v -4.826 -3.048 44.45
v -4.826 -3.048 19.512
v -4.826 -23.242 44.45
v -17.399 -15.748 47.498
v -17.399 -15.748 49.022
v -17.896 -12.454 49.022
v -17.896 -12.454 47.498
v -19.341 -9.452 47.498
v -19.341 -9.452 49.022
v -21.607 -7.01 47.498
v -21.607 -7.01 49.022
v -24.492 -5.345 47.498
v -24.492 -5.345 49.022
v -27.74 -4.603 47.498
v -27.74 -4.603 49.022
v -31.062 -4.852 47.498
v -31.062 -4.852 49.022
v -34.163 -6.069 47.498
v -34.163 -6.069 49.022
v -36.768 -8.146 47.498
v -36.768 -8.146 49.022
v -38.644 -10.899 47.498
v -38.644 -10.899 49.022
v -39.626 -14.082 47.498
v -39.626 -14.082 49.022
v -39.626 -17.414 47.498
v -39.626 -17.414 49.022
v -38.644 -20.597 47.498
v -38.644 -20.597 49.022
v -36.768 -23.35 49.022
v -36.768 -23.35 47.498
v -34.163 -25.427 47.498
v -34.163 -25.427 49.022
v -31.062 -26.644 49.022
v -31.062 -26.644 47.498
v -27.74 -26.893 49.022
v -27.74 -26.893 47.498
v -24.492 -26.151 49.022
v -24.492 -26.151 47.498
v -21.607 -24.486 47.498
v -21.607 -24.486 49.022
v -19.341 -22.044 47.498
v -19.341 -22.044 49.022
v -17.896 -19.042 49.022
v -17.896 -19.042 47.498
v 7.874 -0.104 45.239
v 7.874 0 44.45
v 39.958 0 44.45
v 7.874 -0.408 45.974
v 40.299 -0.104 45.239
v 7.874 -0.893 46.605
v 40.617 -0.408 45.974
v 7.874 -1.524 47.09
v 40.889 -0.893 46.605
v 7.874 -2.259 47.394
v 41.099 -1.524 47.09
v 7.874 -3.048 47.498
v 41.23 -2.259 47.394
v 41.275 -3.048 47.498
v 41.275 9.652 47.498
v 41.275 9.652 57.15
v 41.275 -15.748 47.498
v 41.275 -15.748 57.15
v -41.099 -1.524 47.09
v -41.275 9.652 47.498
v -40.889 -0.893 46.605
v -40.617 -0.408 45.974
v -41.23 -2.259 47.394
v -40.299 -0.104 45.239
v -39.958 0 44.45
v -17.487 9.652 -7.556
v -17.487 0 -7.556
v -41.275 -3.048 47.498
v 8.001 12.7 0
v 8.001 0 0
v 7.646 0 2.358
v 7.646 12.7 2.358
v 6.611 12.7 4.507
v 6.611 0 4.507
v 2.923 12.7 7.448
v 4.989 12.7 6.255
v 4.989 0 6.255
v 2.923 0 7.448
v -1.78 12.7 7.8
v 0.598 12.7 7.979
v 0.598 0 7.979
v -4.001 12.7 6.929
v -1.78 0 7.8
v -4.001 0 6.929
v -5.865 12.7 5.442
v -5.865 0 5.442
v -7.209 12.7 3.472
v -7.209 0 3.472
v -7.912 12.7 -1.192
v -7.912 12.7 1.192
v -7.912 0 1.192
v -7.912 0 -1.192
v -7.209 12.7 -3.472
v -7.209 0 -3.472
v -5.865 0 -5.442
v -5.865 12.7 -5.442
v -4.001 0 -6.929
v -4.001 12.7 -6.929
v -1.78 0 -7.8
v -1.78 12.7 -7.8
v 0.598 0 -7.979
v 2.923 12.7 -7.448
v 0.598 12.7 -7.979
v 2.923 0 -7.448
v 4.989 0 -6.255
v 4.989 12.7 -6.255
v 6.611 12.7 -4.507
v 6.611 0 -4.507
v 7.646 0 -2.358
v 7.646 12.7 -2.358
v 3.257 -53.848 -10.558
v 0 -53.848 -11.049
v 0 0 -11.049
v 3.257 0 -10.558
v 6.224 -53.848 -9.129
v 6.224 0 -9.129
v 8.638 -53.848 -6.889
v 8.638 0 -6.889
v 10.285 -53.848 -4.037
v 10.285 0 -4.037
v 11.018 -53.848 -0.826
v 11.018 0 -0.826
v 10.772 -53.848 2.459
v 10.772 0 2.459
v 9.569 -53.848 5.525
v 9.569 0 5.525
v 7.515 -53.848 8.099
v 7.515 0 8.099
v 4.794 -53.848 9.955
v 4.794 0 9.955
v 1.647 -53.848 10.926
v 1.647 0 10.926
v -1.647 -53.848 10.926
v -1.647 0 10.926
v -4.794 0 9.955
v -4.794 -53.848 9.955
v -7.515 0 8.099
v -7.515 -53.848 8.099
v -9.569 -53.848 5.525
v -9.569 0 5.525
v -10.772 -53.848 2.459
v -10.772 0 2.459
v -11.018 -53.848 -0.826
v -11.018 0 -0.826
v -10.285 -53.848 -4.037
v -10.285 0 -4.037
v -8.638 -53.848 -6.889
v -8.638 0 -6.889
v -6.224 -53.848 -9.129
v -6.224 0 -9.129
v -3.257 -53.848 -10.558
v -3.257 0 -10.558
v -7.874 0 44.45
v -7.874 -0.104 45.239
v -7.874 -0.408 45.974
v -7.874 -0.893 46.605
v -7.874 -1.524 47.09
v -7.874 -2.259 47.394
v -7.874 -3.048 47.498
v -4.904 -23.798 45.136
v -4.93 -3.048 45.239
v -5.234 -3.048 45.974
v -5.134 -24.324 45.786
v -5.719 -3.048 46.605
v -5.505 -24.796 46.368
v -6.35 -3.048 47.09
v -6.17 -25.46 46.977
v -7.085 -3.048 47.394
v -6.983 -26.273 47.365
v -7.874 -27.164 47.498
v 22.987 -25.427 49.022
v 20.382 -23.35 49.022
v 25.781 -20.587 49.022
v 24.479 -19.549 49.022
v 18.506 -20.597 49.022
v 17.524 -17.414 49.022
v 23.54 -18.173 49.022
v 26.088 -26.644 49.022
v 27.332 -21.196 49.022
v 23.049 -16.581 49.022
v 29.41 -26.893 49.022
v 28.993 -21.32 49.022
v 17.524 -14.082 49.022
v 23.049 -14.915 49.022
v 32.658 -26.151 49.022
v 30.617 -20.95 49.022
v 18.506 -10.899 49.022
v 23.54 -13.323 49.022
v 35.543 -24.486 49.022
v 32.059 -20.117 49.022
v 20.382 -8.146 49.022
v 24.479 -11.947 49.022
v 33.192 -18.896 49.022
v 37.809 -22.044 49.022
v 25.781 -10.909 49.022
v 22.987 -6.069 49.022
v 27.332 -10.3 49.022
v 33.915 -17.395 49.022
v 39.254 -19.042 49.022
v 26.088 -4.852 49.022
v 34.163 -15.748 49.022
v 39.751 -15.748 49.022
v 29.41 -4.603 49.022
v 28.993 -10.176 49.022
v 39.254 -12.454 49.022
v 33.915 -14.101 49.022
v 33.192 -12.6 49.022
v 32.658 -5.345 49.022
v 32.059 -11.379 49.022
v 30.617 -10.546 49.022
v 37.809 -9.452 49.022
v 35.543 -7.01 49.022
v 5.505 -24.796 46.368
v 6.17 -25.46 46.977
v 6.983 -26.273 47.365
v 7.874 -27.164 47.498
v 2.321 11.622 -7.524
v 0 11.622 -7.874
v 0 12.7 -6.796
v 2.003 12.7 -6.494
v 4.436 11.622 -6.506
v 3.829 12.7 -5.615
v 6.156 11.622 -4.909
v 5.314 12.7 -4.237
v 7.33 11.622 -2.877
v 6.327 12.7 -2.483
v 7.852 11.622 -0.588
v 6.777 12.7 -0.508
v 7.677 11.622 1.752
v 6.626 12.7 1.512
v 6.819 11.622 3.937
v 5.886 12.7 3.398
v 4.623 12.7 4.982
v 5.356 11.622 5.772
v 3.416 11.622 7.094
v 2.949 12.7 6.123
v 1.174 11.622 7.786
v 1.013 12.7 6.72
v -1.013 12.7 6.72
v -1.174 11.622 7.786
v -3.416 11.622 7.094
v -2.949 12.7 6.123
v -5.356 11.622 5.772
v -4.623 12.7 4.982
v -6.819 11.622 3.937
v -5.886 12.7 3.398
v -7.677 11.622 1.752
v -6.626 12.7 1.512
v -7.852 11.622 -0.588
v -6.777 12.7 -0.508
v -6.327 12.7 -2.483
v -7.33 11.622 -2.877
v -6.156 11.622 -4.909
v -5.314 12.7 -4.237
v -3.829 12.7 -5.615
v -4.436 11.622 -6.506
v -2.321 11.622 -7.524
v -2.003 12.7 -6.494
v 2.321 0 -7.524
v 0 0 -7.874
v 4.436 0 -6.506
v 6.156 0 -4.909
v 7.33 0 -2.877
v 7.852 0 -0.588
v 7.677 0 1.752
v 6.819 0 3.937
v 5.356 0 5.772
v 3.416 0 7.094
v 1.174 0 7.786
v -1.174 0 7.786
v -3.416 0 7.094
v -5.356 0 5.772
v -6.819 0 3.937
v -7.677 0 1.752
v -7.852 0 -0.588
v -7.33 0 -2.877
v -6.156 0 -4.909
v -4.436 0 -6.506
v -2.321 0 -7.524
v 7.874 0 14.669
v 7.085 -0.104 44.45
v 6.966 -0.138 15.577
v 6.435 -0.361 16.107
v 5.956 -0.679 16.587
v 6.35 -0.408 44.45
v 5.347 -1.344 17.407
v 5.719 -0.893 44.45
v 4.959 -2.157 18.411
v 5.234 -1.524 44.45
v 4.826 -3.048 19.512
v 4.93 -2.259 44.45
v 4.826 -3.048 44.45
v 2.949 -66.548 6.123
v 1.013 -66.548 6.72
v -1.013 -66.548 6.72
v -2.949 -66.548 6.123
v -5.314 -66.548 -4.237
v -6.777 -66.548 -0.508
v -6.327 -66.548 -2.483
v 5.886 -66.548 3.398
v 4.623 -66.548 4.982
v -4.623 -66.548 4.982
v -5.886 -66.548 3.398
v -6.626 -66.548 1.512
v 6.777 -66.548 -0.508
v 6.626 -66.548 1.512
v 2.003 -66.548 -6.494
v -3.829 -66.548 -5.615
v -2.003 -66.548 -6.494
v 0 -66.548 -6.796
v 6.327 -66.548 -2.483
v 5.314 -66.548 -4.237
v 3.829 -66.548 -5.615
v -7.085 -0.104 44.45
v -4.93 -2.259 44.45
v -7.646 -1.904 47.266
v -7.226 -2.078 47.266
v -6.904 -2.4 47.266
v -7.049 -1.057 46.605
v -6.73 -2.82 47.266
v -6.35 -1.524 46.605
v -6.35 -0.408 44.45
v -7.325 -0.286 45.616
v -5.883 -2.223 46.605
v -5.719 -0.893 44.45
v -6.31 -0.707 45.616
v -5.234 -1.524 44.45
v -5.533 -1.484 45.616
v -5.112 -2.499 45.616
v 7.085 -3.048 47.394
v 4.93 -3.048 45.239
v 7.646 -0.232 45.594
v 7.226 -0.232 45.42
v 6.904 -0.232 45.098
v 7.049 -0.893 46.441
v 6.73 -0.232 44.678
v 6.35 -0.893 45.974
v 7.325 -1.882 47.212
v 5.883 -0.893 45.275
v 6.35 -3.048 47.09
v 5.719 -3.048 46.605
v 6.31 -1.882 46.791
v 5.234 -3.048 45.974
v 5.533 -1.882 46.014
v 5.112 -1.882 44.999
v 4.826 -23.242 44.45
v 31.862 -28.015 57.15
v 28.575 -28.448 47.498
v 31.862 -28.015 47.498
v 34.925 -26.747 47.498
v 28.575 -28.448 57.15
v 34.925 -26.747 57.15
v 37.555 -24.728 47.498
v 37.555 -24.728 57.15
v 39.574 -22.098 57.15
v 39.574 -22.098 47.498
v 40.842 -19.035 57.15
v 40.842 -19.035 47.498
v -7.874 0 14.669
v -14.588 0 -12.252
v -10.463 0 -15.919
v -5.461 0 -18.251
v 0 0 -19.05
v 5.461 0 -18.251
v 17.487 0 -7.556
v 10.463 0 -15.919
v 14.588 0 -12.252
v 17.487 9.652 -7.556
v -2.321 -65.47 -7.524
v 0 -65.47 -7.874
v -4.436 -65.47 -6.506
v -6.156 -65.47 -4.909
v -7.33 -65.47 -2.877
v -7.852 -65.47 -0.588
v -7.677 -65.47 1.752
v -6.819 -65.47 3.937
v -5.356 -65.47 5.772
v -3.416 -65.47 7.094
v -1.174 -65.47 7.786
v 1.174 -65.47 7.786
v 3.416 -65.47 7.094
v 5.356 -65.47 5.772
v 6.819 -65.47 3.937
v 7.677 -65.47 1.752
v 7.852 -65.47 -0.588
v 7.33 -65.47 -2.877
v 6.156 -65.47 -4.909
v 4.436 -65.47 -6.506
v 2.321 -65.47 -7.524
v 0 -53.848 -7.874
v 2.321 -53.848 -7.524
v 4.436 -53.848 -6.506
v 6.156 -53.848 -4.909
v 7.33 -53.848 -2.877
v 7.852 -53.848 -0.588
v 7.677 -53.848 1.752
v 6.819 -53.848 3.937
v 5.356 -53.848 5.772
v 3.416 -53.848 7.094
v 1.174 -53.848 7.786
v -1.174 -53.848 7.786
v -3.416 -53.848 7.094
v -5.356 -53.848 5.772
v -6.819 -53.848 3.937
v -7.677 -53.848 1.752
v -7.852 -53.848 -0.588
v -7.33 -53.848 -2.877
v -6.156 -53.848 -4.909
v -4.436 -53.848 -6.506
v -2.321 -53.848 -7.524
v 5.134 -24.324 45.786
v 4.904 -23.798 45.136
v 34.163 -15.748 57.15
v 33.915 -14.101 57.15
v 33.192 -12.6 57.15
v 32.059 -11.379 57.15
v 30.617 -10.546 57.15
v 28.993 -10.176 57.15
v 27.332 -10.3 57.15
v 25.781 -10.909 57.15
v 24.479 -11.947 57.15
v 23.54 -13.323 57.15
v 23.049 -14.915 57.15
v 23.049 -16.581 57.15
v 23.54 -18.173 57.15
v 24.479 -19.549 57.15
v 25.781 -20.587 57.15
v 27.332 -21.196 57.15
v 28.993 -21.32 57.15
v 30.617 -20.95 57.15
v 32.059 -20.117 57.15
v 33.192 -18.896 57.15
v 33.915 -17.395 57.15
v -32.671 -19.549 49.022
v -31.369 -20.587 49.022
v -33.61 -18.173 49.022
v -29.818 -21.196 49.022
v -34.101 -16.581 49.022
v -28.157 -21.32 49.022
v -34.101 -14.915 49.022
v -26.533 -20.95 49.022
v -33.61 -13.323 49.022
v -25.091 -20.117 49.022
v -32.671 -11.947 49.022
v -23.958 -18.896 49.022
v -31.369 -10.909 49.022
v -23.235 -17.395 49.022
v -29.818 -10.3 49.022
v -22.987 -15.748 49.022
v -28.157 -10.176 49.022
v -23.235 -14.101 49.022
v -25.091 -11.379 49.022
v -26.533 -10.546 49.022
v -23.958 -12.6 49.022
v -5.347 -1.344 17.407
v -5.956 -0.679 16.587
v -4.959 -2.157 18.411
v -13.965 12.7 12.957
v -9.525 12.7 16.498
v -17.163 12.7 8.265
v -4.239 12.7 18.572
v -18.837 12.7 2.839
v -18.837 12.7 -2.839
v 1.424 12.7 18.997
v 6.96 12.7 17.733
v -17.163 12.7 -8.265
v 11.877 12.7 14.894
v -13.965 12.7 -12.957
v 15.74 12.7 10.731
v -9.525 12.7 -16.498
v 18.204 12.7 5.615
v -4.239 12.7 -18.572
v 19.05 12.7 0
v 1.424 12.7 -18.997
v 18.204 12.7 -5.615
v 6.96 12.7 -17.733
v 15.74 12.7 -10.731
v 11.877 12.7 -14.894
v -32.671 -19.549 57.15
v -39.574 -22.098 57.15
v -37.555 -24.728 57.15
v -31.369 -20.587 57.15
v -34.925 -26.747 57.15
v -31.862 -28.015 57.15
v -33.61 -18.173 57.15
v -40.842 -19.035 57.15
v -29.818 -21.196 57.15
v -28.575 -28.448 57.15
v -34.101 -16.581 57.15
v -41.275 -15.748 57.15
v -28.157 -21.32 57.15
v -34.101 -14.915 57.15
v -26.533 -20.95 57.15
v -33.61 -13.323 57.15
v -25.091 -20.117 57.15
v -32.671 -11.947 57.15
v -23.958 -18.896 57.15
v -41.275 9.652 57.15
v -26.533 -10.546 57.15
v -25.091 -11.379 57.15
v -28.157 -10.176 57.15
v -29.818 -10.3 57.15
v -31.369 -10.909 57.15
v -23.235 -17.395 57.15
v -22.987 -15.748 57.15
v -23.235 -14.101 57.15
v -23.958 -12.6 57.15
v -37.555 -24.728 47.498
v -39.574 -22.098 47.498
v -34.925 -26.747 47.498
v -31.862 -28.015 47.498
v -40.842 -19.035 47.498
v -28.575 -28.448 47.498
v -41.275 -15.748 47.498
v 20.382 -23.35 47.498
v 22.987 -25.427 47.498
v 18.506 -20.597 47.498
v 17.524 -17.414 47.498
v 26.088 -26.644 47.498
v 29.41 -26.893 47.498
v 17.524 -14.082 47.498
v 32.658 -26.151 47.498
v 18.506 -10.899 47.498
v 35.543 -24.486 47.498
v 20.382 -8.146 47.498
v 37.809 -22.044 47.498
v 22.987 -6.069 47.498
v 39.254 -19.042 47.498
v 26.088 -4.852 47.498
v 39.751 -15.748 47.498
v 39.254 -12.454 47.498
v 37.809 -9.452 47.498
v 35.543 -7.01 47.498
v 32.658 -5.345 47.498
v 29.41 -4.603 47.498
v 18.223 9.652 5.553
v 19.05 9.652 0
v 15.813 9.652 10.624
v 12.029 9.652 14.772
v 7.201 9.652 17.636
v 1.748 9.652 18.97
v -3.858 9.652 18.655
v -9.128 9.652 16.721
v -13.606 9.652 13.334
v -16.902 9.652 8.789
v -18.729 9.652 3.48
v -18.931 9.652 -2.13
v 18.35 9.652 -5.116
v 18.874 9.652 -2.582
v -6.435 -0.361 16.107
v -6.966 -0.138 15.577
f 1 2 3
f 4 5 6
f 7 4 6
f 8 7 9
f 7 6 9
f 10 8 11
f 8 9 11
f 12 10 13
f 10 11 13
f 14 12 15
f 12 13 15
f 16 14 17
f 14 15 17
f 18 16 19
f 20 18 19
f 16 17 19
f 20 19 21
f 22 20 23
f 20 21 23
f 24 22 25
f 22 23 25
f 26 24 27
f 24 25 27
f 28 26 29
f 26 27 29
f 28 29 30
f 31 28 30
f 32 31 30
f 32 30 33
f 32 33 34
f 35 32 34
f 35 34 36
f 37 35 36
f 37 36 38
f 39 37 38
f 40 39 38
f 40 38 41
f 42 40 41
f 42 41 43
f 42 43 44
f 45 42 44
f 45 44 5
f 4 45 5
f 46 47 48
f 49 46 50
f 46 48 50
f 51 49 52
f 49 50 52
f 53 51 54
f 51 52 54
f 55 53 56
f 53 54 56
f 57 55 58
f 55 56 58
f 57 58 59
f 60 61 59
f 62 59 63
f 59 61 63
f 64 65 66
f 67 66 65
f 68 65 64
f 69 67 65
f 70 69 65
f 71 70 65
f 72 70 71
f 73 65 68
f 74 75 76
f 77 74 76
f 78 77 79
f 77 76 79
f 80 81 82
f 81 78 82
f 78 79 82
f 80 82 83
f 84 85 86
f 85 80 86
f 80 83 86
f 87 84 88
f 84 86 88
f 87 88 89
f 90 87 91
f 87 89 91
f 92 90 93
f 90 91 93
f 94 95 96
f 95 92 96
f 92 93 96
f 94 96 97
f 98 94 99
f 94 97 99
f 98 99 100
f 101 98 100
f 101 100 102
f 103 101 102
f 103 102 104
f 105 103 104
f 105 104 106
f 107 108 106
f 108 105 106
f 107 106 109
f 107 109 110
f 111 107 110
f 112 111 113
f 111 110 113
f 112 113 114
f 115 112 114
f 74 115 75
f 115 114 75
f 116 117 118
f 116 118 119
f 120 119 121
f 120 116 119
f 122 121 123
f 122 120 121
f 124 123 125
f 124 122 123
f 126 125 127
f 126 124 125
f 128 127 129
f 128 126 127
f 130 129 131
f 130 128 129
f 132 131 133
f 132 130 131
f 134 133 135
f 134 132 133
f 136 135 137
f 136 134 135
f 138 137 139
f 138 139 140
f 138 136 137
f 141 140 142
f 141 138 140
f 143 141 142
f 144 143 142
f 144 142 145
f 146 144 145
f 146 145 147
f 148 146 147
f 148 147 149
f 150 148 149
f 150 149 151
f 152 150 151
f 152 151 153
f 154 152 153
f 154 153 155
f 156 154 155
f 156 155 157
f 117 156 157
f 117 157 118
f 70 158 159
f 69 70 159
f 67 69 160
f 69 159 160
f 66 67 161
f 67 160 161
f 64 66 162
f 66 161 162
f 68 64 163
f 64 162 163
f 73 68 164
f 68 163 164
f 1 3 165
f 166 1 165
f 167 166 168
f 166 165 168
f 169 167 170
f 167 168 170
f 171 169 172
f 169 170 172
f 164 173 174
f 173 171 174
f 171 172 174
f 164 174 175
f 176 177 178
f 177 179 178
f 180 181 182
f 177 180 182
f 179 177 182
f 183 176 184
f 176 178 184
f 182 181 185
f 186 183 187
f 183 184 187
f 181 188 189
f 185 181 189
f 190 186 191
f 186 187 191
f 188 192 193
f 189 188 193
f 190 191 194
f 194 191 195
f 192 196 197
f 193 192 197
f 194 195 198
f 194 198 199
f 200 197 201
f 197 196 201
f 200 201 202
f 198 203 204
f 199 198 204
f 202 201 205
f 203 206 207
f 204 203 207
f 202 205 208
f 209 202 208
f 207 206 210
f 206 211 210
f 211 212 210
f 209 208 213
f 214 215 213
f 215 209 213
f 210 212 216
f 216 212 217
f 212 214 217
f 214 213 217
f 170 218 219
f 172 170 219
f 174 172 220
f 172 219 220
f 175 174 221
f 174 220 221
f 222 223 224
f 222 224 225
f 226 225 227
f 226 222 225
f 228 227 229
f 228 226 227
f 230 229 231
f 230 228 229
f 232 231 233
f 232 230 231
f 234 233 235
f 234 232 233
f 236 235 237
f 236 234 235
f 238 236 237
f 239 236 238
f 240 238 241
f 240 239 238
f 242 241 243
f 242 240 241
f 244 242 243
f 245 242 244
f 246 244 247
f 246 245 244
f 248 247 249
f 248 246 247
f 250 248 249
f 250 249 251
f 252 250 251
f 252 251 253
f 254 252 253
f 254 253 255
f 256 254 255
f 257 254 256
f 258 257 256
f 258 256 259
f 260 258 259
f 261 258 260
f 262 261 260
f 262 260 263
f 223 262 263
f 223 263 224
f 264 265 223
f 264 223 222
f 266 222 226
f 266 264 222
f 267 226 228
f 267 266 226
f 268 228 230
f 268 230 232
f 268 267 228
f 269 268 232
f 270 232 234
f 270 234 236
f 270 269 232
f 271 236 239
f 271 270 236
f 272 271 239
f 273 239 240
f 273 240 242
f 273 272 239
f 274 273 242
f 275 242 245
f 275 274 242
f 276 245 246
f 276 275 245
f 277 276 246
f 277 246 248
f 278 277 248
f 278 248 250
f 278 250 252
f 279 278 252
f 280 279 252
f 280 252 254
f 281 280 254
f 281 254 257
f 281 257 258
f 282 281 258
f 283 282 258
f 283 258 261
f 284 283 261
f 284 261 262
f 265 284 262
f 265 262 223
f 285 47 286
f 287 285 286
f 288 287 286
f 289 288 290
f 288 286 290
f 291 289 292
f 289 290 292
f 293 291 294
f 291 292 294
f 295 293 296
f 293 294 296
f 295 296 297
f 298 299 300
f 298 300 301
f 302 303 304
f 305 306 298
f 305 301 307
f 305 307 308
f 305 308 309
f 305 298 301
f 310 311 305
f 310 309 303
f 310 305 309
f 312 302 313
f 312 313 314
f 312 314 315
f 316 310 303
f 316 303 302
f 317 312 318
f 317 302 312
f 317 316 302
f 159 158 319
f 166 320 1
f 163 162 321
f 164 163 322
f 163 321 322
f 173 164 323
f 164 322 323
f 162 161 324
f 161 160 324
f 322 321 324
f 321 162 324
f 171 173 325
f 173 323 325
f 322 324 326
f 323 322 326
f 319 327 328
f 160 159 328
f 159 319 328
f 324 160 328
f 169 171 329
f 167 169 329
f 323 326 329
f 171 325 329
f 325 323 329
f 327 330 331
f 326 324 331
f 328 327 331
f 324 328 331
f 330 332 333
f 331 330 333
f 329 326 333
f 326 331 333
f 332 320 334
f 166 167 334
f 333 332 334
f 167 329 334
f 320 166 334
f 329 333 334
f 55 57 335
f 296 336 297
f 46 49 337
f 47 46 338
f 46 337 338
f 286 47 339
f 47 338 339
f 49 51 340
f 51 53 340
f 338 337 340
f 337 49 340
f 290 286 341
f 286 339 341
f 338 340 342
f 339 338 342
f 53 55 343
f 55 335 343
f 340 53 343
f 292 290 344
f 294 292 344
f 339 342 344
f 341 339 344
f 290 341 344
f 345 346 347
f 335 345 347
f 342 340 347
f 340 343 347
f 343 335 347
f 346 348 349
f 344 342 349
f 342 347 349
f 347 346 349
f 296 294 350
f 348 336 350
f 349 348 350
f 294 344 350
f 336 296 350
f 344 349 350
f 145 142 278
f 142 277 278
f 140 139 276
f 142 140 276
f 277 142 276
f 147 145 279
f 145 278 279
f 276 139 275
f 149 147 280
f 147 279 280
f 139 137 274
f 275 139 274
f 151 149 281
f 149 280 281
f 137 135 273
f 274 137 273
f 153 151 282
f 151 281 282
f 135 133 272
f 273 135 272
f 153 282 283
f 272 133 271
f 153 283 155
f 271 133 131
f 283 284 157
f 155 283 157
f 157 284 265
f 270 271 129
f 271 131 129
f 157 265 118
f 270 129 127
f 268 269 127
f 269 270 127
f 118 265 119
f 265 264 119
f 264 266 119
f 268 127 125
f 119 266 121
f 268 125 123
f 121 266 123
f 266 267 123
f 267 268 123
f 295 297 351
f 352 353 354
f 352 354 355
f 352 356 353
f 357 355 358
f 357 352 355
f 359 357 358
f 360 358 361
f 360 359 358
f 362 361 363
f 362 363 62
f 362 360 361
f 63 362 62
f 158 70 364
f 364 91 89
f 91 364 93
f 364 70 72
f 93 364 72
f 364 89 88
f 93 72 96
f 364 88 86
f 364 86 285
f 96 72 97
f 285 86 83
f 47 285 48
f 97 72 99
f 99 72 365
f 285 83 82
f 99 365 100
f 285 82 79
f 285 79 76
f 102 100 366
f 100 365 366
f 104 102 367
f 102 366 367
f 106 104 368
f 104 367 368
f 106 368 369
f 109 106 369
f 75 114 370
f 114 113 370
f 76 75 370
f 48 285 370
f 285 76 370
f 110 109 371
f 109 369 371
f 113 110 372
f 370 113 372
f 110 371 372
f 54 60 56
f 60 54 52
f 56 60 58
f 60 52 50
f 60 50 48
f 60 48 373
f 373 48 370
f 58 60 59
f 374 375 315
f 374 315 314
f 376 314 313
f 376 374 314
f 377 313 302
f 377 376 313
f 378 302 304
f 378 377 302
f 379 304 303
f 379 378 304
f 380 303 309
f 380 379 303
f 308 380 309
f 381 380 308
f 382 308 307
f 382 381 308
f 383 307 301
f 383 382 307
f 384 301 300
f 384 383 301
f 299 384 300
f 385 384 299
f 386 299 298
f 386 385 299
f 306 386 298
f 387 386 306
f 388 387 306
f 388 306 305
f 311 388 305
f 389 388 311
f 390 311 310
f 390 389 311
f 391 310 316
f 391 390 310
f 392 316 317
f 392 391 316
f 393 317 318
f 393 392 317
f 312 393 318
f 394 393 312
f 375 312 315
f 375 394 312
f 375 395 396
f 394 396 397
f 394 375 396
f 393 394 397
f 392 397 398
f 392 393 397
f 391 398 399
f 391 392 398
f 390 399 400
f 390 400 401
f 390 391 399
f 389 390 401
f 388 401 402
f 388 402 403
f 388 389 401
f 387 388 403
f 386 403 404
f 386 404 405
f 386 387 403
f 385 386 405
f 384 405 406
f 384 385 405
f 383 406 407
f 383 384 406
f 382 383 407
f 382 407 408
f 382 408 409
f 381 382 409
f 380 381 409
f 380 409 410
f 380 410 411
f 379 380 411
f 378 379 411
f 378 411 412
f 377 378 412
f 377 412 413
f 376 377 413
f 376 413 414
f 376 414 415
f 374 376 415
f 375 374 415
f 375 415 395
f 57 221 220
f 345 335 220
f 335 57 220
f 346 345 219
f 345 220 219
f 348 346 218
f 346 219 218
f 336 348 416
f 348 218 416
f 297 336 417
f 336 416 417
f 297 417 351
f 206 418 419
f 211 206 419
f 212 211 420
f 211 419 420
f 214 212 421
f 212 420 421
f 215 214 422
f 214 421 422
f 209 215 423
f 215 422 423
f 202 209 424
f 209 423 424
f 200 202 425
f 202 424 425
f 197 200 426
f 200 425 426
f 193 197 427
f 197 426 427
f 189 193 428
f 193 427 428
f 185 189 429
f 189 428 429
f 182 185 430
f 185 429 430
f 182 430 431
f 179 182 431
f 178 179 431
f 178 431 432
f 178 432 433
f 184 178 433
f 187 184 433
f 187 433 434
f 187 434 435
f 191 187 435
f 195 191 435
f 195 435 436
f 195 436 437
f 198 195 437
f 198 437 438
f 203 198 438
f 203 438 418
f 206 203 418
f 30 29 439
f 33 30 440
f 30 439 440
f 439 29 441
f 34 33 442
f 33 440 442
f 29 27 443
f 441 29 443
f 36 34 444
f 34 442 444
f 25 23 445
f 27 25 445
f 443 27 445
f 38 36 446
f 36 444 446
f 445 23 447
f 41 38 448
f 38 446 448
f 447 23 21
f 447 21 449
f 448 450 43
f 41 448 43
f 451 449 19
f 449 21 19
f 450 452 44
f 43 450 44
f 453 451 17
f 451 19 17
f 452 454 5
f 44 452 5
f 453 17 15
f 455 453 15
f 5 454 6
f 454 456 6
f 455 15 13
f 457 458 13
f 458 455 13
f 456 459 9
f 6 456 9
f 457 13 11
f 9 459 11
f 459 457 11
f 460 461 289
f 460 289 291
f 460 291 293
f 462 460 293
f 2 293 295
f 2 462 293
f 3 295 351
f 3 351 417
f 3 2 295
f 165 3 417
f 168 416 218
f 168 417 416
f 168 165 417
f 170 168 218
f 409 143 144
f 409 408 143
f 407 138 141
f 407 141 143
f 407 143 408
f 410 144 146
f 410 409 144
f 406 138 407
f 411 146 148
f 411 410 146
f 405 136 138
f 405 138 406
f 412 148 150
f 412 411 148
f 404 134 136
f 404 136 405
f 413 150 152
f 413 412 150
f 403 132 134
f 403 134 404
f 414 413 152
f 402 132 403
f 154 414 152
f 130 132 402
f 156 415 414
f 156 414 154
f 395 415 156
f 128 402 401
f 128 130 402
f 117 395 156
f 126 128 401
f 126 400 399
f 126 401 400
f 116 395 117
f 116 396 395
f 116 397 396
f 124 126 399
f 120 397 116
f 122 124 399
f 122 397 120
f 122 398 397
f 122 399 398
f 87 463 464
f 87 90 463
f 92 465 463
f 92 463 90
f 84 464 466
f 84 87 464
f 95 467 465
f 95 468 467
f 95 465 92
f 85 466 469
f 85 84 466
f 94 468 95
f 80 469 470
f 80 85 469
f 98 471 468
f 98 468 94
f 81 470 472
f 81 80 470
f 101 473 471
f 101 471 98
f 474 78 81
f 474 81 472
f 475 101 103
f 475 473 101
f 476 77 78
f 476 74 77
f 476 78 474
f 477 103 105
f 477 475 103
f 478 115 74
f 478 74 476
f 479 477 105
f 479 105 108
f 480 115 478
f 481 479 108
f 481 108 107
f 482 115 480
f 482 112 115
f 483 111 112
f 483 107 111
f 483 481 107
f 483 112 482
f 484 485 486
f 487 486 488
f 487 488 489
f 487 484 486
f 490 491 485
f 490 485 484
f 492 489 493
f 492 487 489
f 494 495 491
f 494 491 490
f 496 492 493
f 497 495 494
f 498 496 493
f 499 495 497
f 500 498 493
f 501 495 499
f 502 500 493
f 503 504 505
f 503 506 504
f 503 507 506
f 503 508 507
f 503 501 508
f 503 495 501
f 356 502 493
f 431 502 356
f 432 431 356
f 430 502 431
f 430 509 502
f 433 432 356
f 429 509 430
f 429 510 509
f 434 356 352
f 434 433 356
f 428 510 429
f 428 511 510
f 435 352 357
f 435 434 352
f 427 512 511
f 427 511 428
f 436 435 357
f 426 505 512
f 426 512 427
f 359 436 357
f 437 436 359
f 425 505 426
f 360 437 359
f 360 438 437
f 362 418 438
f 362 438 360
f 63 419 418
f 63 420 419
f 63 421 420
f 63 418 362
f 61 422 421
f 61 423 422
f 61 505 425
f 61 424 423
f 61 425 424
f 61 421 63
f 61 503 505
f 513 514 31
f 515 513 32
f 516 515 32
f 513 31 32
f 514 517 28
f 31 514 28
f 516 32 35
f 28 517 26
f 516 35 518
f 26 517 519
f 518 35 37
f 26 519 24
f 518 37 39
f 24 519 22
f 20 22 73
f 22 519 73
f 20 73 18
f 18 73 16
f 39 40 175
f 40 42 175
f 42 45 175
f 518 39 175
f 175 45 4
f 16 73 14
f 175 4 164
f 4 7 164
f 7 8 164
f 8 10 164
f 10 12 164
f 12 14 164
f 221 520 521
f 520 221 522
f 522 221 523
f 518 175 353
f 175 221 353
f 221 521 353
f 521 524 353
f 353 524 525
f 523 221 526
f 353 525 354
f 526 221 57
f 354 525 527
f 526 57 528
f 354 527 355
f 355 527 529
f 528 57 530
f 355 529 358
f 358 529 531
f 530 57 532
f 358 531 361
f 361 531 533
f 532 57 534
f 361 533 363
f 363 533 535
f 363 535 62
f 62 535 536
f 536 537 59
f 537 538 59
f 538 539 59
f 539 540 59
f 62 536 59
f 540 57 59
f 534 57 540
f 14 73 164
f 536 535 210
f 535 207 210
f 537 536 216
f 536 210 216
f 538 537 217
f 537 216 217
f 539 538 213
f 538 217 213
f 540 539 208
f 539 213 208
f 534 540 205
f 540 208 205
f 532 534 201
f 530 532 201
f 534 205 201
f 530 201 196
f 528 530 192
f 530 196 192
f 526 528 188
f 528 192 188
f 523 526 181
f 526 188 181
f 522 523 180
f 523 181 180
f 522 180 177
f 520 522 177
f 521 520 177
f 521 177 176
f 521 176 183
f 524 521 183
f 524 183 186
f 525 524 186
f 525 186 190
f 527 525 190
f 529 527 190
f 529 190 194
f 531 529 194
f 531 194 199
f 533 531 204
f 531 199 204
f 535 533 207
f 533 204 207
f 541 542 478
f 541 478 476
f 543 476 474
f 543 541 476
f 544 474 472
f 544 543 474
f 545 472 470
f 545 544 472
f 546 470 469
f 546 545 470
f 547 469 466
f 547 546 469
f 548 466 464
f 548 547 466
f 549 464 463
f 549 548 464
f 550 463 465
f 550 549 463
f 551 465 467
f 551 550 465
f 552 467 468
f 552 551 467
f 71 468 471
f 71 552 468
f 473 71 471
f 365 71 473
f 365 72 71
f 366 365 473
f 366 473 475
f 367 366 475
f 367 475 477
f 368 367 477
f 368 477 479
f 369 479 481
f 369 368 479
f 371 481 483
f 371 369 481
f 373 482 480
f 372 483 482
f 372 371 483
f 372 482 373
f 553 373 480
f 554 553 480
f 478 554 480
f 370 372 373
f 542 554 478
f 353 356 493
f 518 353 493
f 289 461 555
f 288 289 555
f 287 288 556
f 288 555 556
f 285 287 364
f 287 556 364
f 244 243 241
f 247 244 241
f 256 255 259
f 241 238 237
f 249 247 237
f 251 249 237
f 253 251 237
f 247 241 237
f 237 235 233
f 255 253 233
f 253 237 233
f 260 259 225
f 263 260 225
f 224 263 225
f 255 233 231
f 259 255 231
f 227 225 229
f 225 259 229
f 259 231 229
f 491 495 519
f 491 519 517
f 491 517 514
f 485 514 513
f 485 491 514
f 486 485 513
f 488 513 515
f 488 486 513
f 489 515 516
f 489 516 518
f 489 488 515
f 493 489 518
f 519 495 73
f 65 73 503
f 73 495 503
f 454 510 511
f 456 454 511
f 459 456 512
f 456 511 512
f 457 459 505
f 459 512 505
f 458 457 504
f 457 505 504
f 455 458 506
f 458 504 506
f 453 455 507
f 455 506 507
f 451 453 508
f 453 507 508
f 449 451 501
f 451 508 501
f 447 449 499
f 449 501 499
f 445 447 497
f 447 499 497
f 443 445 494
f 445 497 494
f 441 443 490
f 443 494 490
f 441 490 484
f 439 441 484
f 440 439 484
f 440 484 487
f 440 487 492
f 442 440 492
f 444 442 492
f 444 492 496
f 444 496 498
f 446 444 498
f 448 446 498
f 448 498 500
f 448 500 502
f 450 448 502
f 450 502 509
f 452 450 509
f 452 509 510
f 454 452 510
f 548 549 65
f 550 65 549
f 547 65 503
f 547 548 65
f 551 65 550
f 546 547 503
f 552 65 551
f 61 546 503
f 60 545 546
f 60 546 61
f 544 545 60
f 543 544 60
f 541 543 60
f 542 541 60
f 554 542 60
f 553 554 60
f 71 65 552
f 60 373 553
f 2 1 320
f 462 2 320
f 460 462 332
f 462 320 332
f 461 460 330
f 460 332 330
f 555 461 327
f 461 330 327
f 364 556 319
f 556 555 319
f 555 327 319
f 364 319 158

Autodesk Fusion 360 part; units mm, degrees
sketch "Sketch1" plane through (0, 0, 0) normal (0, 1, 0) x (1, 0, 0) in component "Component"
  line L0 (26.924, -11.049) -> (-26.924, -11.049)
  line L1 (-26.924, -11.049) -> (-26.924, 11.049)
  line L2 (-26.924, 11.049) -> (26.924, 11.049)
  line L3 (26.924, 11.049) -> (26.924, -11.049)
  line L4 (38.5464, -7.874) -> (-38.5464, -7.874)
  line L5 (-39.624, -6.7964) -> (-39.624, 6.7964)
  line L6 (-38.5464, 7.874) -> (38.5464, 7.874)
  line L7 (39.624, 6.7964) -> (39.624, -6.7964)
  line L8 (-39.624, 6.7964) -> (-39.624, -6.7964) construction
  line L9 (-39.624, 6.7964) -> (-38.5464, 7.874)
  line L10 (-39.624, 6.7964) -> (-38.1, 6.7964) construction
  line L11 (-39.624, -6.7964) -> (-38.5464, -7.874)
  line L12 (-39.624, -6.7964) -> (-38.1, -6.7964) construction
  line L13 (0, -1.75) -> (0, -22.5)
  line L14 (39.624, 6.7964) -> (38.5464, 7.874)
  line L15 (39.624, 6.7964) -> (39.624, -6.7964) construction
  line L16 (39.624, -6.7964) -> (38.5464, -7.874)
  line L17 (-45.72, 0) -> (46.9131, 0)
  dimension "d1" = 53.848
  dimension "d2" = 22.098
  dimension "d11" = 45
  dimension "d12" = 1.524
  dimension "d13" = 1.524
  dimension "d14" = 45
revolve "Revolve1" add sketch "Sketch1" angle 360 about axis through (1.75, 0, 0) along (1, 0, 0) contours L1 L3 L6 L17 | L3 L6 L7 L14 L17 | L1 L2 L3 L6 | L1 L5 L6 L9 L17 makes body 1 in component "Component"
sketch "Sketch2" plane through (0, 0, 0) normal (0, 1, 0) x (1, 0, 0) in component "Component"
  circle A0 centre (0, 0) radius 8.001
  dimension "d16" = 16.002
sketch "Sketch1 (2)" plane through (0, 0, 0) normal (0, 1, 0) x (1, 0, 0) in component "Component'"
  circle A0 centre (0, 0) radius 8.001
  circle A1 centre (0, 0) radius 19.05
  line L0 (0, 0) -> (0, -57.15) construction
  line L1 (-41.275, -57.15) -> (41.275, -57.15)
  line L2 (-41.275, -57.15) -> (41.275, -57.15)
  line L3 (41.275, -57.15) -> (41.275, -47.498)
  line L4 (41.275, -47.498) -> (-41.275, -47.498)
  line L5 (-41.275, -47.498) -> (-41.275, -57.15)
  line L6 (-41.275, -47.498) -> (-17.4874, 7.5559)
  line L7 (41.275, -47.498) -> (17.4874, 7.5559)
  line L8 (4.826, -15.748) -> (-4.826, -15.748)
  line L9 (-4.826, -15.748) -> (-4.826, -47.498)
  line L10 (-4.826, -47.498) -> (4.826, -47.498)
  line L11 (4.826, -47.498) -> (4.826, -15.748)
  dimension "d17" = 16.002
  dimension "d18" = 38.1
  dimension "d19" = 57.15
  dimension "d21" = 82.55
  dimension "d22" = 9.652
  dimension "d39" = 9.652
  dimension "d40" = 31.75
extrude "Extrude1" add sketch "Sketch1 (2)" along normal blind 9.652 separate body contours A1 L4 L7 L11 | A1 L4 L9 L10 L11 | A1 L4 L6 L9 | L1 L2 L3 L4 L5 L10 makes body 2 in component "Component'"
extrude "Extrude2" add sketch "Sketch1 (2)" along normal blind 12.7 contours A1 L8 L9 L11 | A1 L8 L9 L11 bodies 2 in component "Component'"
sketch "Sketch2 (2)" plane through (0, 0, 57.15) normal (0, 0, 1) x (1, 0, 0) in component "Component'"
  line L0 (-41.275, 0) -> (41.275, 0)
  line L1 (41.275, 0) -> (41.275, 9.652)
  line L2 (41.275, 9.652) -> (-41.275, 9.652)
  line L3 (-41.275, 9.652) -> (-41.275, 0)
  line L4 (-41.275, 0) -> (41.275, 0)
  line L5 (-41.275, 9.652) -> (41.275, 9.652)
  line L6 (41.275, 9.652) -> (41.275, -15.748)
  line L7 (28.575, -28.448) -> (-28.575, -28.448)
  line L8 (-41.275, -15.748) -> (-41.275, 9.652)
  arc A0 (-41.275, -15.748) -> (-28.575, -28.448) centre (-28.575, -15.748) ccw
  arc A1 (28.575, -28.448) -> (41.275, -15.748) centre (28.575, -15.748) ccw
  circle A2 centre (-28.575, -15.748) radius 5.588
  circle A3 centre (-28.575, -15.748) radius 11.176
  circle A4 centre (28.575, -15.748) radius 5.588
  circle A5 centre (28.575, -15.748) radius 11.176
  point P0 (-41.275, -28.448)
  dimension "d28" = 82.55
  dimension "d44" = 82.55
  dimension "d45" = 38.1
  dimension "d46" = 12.7
  dimension "d47" = 12.7
  dimension "d48" = 11.176
  dimension "d49" = 22.352
  dimension "d50" = 11.176
  dimension "d51" = 22.352
extrude "Extrude6" add sketch "Sketch2 (2)" against normal blind 9.652 contours L0 L4 L6 L7 L8 A0 A1 bodies 2 in component "Component'"
extrude "Extrude7" add sketch "Sketch2 (2)" against normal up to surface (8.128 mm away) contours A3 | A5 bodies 2 in component "Component'"
extrude "Extrude8" add sketch "Sketch1 (2)" against normal up to surface (28.448 mm away) contours A1 L4 L9 L10 L11 | A1 L8 L9 L11 picked at (0, -16.8487) bodies 2 in component "Component'"
sketch "Sketch4" plane through (-4.826, 0, 0) normal (-1, 0, 0) x (0, 0, 1) in component "Component'"
  line L0 (15.748, -28.448) -> (47.498, -28.448)
  line L1 (47.498, -28.448) -> (47.498, 0)
  line L2 (47.498, 0) -> (15.748, 0)
  line L3 (15.748, 0) -> (15.748, -28.448)
  line L4 (15.748, 0) -> (47.498, -25.7106)
  line L5 (15.748, 0) -> (81.2963, 0) construction
  dimension "d58" = 39
extrude "Extrude10" cut sketch "Sketch4" against normal up to surface (9.652 mm away) contours L0 L1 L3 L4 bodies 2 in component "Component'"
fillet "Fillet1" radius 3.048 6 edges at (0, 0, 15.748) (-4.826, 0, 31.623) (-4.826, -12.8553, 47.498) (0, -25.7106, 47.498) (4.826, -12.8553, 47.498) (4.826, 0, 31.623) on bodies 2 in component "Component'"
fillet "Fillet1" radius 3.048 2 edges at (-23.0505, 0, 47.498) (23.0505, 0, 47.498) on bodies 2 in component "Component'"
component "Component" placed x (0, -1, 0) y (1, 0, 0) z (0, 0, 1) at (0, -26.924, 0)
component "Component'" placed x (1, 0, 0) y (0, 1, 0) z (0, 0, 1) at (0, 0, 0)
